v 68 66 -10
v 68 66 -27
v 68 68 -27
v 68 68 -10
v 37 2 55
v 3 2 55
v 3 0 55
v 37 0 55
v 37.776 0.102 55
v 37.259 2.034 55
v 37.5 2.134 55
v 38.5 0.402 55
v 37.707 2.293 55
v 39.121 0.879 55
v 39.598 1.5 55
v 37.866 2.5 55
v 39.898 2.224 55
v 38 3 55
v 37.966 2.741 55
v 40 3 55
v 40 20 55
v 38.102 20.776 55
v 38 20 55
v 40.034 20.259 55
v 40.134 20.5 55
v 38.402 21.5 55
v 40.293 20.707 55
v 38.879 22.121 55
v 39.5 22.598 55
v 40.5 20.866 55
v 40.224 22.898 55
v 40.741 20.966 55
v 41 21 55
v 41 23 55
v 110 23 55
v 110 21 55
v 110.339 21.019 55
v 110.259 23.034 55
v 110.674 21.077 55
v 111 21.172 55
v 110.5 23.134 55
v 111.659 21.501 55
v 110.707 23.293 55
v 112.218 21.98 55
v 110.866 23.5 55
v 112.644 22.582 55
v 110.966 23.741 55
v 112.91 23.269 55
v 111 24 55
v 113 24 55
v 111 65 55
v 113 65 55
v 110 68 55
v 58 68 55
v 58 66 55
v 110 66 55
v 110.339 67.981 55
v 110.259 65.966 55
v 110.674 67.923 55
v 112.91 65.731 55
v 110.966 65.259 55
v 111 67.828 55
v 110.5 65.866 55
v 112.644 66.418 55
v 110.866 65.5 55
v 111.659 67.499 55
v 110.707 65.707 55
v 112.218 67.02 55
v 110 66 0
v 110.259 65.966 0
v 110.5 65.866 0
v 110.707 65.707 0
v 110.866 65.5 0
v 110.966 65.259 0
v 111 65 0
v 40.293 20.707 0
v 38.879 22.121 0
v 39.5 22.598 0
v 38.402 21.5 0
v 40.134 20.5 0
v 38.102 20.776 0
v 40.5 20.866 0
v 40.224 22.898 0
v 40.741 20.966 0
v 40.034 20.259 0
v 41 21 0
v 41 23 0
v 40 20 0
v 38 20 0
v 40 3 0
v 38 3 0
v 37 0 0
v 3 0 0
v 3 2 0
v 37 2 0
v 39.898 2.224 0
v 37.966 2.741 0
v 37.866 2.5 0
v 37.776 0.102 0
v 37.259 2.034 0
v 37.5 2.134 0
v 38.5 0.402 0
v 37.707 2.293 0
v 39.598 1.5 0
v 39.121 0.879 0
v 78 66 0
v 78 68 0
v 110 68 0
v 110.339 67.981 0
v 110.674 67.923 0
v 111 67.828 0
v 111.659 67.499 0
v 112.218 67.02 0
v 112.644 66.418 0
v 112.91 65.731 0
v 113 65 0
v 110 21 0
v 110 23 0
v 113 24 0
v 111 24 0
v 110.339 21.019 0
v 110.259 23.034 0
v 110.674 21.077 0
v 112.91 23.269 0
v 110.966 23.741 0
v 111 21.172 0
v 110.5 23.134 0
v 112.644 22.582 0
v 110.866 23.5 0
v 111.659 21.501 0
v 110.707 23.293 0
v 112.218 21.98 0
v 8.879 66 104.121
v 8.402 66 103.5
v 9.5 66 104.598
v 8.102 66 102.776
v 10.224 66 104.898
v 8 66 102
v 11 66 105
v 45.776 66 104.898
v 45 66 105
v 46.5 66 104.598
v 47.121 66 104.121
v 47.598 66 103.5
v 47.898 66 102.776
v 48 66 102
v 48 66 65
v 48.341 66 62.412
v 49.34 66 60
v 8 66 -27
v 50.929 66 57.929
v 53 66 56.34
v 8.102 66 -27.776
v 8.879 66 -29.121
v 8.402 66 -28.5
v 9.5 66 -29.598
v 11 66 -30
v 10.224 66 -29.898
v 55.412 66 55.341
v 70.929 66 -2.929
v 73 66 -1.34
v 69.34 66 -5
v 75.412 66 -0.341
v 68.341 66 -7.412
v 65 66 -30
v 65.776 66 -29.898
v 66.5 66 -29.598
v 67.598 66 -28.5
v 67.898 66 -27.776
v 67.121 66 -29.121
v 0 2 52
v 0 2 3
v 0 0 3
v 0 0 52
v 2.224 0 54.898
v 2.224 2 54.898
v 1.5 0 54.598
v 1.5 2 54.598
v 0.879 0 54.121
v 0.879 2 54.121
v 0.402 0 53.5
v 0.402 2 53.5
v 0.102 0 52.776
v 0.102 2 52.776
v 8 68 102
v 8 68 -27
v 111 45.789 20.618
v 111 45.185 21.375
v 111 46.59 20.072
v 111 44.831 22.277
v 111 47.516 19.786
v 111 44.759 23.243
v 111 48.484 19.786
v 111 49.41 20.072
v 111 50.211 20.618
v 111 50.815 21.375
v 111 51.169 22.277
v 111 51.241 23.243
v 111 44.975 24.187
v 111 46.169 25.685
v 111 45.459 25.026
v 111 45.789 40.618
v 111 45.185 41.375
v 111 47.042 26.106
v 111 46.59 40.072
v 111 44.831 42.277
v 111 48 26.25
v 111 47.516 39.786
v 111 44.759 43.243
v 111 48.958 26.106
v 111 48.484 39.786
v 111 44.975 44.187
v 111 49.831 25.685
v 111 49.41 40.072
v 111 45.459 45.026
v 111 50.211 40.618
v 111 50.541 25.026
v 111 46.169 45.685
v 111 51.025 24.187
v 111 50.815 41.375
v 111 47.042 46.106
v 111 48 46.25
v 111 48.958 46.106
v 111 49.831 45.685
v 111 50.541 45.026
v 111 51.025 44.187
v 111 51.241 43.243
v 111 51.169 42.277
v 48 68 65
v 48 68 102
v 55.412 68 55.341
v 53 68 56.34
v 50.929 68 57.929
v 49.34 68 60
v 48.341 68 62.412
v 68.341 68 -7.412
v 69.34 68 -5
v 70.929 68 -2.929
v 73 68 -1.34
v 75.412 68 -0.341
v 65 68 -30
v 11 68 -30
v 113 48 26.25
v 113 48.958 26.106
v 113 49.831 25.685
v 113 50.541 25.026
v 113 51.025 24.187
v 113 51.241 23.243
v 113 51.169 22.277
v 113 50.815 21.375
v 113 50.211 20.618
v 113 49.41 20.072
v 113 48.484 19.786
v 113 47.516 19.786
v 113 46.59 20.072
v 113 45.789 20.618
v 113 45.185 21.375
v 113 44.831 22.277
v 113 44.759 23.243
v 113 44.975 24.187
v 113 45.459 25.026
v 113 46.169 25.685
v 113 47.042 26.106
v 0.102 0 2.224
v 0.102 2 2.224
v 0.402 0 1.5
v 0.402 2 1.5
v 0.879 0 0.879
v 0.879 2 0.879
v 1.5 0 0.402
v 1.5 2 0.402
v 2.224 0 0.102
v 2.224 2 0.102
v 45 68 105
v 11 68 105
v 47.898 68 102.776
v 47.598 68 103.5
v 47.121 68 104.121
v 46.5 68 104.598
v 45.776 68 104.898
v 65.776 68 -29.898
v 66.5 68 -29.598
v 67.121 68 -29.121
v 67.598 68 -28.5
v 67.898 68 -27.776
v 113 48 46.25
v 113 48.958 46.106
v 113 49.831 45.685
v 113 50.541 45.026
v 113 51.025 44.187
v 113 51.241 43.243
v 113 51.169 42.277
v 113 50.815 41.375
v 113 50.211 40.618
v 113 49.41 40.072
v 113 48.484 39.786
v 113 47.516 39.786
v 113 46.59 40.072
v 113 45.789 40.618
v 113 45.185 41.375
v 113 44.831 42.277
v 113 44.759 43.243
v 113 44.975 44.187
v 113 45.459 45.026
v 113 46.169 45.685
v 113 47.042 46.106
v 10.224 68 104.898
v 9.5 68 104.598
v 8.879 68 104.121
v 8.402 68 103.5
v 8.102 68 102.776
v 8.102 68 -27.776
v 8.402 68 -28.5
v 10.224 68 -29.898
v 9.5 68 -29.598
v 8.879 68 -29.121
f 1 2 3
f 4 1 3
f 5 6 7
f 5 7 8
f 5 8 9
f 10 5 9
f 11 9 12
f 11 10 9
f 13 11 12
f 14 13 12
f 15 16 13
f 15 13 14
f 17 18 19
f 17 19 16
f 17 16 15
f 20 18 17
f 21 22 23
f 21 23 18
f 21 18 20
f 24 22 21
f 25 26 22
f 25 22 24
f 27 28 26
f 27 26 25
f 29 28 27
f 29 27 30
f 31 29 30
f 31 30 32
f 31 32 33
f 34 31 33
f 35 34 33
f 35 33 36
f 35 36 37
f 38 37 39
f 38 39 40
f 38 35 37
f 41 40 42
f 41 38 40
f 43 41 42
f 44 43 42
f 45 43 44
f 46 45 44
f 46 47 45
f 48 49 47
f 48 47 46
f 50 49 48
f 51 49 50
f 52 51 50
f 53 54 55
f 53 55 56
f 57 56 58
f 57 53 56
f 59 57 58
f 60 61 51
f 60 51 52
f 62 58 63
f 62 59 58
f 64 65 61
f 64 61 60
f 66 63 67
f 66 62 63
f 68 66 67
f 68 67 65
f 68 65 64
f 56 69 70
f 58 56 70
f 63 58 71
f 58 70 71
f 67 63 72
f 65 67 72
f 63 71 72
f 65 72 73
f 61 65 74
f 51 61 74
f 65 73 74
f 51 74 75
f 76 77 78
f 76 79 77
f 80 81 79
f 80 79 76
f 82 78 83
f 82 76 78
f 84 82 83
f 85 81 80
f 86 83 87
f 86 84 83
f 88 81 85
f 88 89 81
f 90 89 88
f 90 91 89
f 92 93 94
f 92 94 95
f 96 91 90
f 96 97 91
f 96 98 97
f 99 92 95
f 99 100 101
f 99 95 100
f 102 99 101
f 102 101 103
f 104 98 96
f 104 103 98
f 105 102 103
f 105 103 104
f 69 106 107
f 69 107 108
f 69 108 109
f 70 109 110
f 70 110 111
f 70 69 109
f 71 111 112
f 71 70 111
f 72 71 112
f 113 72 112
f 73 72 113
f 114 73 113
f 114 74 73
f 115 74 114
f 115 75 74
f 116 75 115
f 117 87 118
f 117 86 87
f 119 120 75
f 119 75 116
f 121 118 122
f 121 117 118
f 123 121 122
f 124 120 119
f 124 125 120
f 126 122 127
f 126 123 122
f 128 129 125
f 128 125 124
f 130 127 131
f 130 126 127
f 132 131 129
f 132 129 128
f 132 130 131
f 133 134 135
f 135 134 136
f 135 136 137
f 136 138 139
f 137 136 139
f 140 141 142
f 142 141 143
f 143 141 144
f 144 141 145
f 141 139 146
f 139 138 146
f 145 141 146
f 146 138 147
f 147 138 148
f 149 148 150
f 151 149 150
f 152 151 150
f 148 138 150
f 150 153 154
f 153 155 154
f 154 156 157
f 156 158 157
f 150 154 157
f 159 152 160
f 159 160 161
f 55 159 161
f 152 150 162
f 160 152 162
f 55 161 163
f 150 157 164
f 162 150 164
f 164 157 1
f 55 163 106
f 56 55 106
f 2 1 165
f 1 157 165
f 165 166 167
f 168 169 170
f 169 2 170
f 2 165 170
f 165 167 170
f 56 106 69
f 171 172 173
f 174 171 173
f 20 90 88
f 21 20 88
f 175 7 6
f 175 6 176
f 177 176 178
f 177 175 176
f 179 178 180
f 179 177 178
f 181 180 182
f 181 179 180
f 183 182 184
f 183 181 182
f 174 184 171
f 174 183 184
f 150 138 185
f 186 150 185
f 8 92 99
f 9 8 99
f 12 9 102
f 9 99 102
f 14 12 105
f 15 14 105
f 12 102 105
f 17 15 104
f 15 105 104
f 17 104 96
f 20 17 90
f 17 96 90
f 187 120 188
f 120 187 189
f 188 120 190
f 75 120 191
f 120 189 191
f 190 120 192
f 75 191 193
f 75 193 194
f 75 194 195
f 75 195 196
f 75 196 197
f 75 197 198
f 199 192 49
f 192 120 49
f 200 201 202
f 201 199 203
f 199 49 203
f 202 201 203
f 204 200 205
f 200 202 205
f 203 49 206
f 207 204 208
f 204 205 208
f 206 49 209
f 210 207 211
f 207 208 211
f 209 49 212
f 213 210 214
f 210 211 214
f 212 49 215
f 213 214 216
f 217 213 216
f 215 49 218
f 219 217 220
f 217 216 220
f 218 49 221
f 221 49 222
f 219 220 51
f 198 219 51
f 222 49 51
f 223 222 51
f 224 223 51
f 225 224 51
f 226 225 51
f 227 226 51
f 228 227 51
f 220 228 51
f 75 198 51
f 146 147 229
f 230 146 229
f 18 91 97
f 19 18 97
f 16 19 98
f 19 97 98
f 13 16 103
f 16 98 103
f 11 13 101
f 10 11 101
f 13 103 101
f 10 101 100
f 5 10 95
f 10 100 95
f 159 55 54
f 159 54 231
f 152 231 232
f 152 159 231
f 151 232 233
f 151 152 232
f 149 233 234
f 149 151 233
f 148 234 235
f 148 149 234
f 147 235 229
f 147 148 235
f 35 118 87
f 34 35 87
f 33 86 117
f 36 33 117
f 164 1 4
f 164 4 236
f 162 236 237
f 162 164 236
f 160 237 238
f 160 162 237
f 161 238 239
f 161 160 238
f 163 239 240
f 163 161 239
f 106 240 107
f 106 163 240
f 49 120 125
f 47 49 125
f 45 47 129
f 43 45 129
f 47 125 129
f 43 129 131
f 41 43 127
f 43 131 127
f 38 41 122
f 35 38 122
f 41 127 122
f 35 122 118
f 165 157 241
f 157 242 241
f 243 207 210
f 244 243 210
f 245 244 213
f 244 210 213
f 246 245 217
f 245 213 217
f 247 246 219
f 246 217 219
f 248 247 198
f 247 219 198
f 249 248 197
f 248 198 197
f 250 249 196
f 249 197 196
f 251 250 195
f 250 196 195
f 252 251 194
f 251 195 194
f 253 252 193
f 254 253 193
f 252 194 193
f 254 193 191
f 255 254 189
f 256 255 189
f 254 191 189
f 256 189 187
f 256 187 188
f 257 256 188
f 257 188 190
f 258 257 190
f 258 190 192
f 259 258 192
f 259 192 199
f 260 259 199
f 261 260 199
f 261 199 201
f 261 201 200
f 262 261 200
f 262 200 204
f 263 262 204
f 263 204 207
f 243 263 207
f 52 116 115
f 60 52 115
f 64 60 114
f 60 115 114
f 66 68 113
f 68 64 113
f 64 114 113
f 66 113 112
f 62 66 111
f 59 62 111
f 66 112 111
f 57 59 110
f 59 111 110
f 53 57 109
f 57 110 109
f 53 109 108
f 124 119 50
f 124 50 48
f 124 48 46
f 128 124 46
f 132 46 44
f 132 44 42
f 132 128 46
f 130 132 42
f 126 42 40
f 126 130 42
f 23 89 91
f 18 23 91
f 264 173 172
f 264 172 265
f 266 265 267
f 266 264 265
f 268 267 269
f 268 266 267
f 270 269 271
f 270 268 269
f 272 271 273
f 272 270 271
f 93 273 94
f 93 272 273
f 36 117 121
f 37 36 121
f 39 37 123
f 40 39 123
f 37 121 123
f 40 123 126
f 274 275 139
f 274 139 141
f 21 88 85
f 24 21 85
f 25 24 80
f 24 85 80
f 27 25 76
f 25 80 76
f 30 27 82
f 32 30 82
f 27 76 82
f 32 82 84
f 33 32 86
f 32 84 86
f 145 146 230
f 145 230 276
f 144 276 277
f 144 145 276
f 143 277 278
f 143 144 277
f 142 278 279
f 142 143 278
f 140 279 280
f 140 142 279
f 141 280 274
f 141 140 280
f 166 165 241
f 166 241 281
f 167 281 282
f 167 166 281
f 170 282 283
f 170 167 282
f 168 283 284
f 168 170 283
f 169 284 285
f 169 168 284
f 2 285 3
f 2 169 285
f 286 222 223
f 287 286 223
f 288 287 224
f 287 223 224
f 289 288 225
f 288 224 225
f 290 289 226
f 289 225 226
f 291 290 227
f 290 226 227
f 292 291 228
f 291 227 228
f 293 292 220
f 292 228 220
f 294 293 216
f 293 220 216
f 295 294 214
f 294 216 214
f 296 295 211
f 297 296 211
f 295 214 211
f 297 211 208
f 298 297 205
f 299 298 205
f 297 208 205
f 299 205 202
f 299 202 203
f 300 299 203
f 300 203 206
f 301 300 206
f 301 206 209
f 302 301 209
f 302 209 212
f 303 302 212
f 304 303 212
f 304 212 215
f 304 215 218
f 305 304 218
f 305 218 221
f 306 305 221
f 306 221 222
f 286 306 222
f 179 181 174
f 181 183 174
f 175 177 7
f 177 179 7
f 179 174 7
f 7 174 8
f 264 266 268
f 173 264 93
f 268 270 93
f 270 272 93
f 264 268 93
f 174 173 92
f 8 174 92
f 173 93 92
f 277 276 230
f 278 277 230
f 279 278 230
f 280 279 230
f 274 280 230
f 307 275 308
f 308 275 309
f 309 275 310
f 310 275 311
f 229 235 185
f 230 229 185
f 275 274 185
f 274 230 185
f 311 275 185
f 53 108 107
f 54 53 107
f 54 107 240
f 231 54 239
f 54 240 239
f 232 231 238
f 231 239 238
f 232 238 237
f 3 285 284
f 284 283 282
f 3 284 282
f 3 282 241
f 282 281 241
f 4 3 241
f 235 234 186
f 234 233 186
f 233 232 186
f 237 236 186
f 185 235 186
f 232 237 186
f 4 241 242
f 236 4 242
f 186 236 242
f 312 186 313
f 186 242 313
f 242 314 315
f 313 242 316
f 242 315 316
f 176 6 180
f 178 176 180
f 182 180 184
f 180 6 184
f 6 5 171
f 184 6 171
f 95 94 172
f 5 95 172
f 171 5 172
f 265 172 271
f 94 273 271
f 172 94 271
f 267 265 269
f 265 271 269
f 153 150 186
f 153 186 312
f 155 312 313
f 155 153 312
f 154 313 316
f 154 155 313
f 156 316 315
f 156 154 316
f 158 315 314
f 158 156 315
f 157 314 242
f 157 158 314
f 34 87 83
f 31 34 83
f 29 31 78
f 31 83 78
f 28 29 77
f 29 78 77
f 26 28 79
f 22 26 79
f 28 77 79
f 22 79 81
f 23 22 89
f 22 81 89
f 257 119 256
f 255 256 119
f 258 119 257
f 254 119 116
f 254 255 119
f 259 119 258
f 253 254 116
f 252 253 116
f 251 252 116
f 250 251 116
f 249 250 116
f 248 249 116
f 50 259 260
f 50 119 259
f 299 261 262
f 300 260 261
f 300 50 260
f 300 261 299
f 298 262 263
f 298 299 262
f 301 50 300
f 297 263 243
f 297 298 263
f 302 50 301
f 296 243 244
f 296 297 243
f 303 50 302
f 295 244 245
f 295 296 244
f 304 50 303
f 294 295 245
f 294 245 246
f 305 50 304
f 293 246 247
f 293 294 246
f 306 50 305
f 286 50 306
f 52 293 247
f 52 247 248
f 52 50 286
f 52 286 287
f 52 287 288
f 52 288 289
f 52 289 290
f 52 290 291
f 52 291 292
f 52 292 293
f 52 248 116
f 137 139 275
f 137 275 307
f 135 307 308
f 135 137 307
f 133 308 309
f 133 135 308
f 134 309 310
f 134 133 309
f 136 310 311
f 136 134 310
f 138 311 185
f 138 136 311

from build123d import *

# Parameters (mm, degrees)
EXTRUDE_1_DEPTH             = 55
EXTRUDE_3_DEPTH             = 2
CUT_EXTRUDE_1_REACH         = 169.242
SKETCH_6_R                  = 3.25
FILLET_1_R                  = 3
SHEET_METAL_1_OUTLINE_W     = 2
SHEET_METAL_1_OUTLINE_H     = 135
SHEET_METAL_1_OUTLINE_W_2   = 23
SHEET_METAL_1_OUTLINE_H_2   = 55
SHEET_METAL_1_DEPTH         = 111
SHEET_START                 = 111
SHEET_METAL_1_2_DEPTH       = 2
SHEET_START_2               = -30
SHEET_METAL_1_3_DEPTH       = 135
SHEET_METAL_1_3_2_DEPTH     = 55
SHEET_METAL_1_3_3_OUTLINE_W = 40
SHEET_METAL_1_3_3_OUTLINE_H = 2
SHEET_METAL_1_3_3_DEPTH     = 135
SHEET_METAL_1_3_4_OUTLINE_W = 20
SHEET_METAL_1_3_4_OUTLINE_H = 2
SHEET_METAL_1_3_4_DEPTH     = 95
SHEET_START_3               = -10
SHEET_METAL_1_3_5_DEPTH     = 10
SHEET_START_4               = -1
SHEET_METAL_1_3_6_DEPTH     = 70


with BuildPart() as part:
    # Sketch 2 → 凸台-拉伸1 (new body)
    with BuildSketch(Plane.XY):
        Polygon((0, 0), (40, 0), (40, 21), (113, 21), (113, 68), (8, 68), (8, 66), (111, 66), (111, 23), (38, 23), (38, 2), (0, 2), align=None)
    extrude(amount=EXTRUDE_1_DEPTH)

    # 草图4 → 凸台-拉伸3 (add)
    with BuildSketch(Plane(origin=(0, 68, 0), x_dir=(1, 0, 0), z_dir=(0, 1, 0))):
        with BuildLine():
            Line((8, 27), (8, 0))
            Line((8, 0), (78, 0))
            ThreePointArc((78, 0), (70.928932188, 2.928932188), (68, 10))
            Line((68, 10), (68, 27))
            ThreePointArc((68, 27), (67.121320344, 29.121320344), (65, 30))
            Line((65, 30), (11, 30))
            ThreePointArc((11, 30), (8.878679656, 29.121320344), (8, 27))
        make_face()
        with BuildLine():
            Line((58, -55), (8, -55))
            Line((8, -55), (8, -102))
            ThreePointArc((8, -102), (8.878679656, -104.121320344), (11, -105))
            Line((11, -105), (45, -105))
            ThreePointArc((45, -105), (47.121320344, -104.121320344), (48, -102))
            Line((48, -102), (48, -65))
            ThreePointArc((48, -65), (50.928932188, -57.928932188), (58, -55))
        make_face()
    extrude(amount=-EXTRUDE_3_DEPTH)

    # 草图6 → 切除-拉伸1 (cut, up to next)
    with BuildSketch(Plane.ZY.offset(-111), mode=Mode.PRIVATE) as cut_extrude_1_sk1:
        with Locations((23, 48)):
            Circle(SKETCH_6_R)
    cut_extrude_1_tool1 = extrude(cut_extrude_1_sk1.sketch, amount=-CUT_EXTRUDE_1_REACH, mode=Mode.PRIVATE) & part.part
    # 草图6 → 切除-拉伸1 (cut, up to next)
    with BuildSketch(Plane.ZY.offset(-111), mode=Mode.PRIVATE) as cut_extrude_1_sk2:
        with Locations((43, 48)):
            Circle(SKETCH_6_R)
    cut_extrude_1_tool2 = extrude(cut_extrude_1_sk2.sketch, amount=-CUT_EXTRUDE_1_REACH, mode=Mode.PRIVATE) & part.part
    add(cut_extrude_1_tool1.solids().sort_by_distance((111, 48, 23))[0], mode=Mode.SUBTRACT)
    add(cut_extrude_1_tool2.solids().sort_by_distance((111, 48, 43))[0], mode=Mode.SUBTRACT)

    # 圆角1
    fillet_1_edges = [part.edges().sort_by_distance(p)[0] for p in [
        (0, 1, 0),
        (0, 1, 55),
    ]]
    fillet(fillet_1_edges, radius=FILLET_1_R)

    # Sheet Metal 1: read off the stored shape, not the designer's step
    # Sheet Metal 1 outline → Sheet Metal 1 (cut)
    with BuildSketch(Plane.YZ):
        with Locations((67, 37.5)):
            Rectangle(SHEET_METAL_1_OUTLINE_W, SHEET_METAL_1_OUTLINE_H)
        with Locations((11.5, 27.5)):
            Rectangle(SHEET_METAL_1_OUTLINE_W_2, SHEET_METAL_1_OUTLINE_H_2)
    extrude(amount=SHEET_METAL_1_DEPTH, mode=Mode.SUBTRACT)

    # Sheet Metal 1 2 outline → Sheet Metal 1 2 (add)
    with BuildSketch(Plane.YZ.offset(SHEET_START)):
        with BuildLine():
            Line((68, 0), (100, 0))
            ThreePointArc((100, 0), (107.071067812, -2.928932188), (110, -10))
            Line((110, -10), (110, -27))
            ThreePointArc((110, -27), (110.878679656, -29.121320344), (113, -30))
            Line((113, -30), (167, -30))
            ThreePointArc((167, -30), (169.121320344, -29.121320344), (170, -27))
            Line((170, -27), (170, 102))
            ThreePointArc((170, 102), (169.121320344, 104.121320344), (167, 105))
            Line((167, 105), (133, 105))
            ThreePointArc((133, 105), (130.878679656, 104.121320344), (130, 102))
            Line((130, 102), (130, 65))
            ThreePointArc((130, 65), (127.071067812, 57.928932188), (120, 55))
            Line((120, 55), (68, 55))
            Line((68, 55), (68, 0))
        make_face()
        with BuildLine():
            Line((21, 0), (21, 55))
            Line((21, 55), (-105, 55))
            ThreePointArc((-105, 55), (-107.121320344, 54.121320344), (-108, 52))
            Line((-108, 52), (-108, 3))
            ThreePointArc((-108, 3), (-107.121320344, 0.878679656), (-105, 0))
            Line((-105, 0), (21, 0))
        make_face()
    extrude(amount=SHEET_METAL_1_2_DEPTH)

    # Sheet Metal 1 3: read off the stored shape, not the designer's step
    # Sheet Metal 1 3 outline → Sheet Metal 1 3 (cut)
    with BuildSketch(Plane.XY.offset(SHEET_START_2)):
        with BuildLine():
            ThreePointArc((113, 24), (112.449489743, 22.267949192), (111, 21.171572875))
            Line((111, 21.171572875), (111, -108))
            Line((111, -108), (113, -108))
            Line((113, -108), (113, 24))
        make_face()
        with BuildLine():
            ThreePointArc((111, 67.828427125), (112.449489743, 66.732050808), (113, 65))
            Line((113, 65), (113, 170))
            Line((113, 170), (111, 170))
            Line((111, 170), (111, 67.828427125))
        make_face()
    extrude(amount=SHEET_METAL_1_3_DEPTH, mode=Mode.SUBTRACT)

    # Sheet Metal 1 3 2 outline → Sheet Metal 1 3 2 (add)
    with BuildSketch(Plane.XY):
        with BuildLine():
            Line((37, 2), (0, 2))
            Line((0, 2), (0, 0))
            Line((0, 0), (37, 0))
            ThreePointArc((37, 0), (39.121320344, 0.878679656), (40, 3))
            Line((40, 3), (40, 20))
            ThreePointArc((40, 20), (40.292893219, 20.707106781), (41, 21))
            Line((41, 21), (110, 21))
            ThreePointArc((110, 21), (110.507305936, 21.043204321), (111, 21.171572875))
            Line((111, 21.171572875), (111, 24))
            ThreePointArc((111, 24), (110.707106781, 23.292893219), (110, 23))
            Line((110, 23), (41, 23))
            ThreePointArc((41, 23), (38.878679656, 22.121320344), (38, 20))
            Line((38, 20), (38, 3))
            ThreePointArc((38, 3), (37.707106781, 2.292893219), (37, 2))
        make_face()
        with BuildLine():
            ThreePointArc((110, 66), (110.707106781, 65.707106781), (111, 65))
            Line((111, 65), (111, 67.828427125))
            ThreePointArc((111, 67.828427125), (110.507305936, 67.956795679), (110, 68))
            Line((110, 68), (8, 68))
            Line((8, 68), (8, 66))
            Line((8, 66), (110, 66))
        make_face()
    extrude(amount=SHEET_METAL_1_3_2_DEPTH)

    # Sheet Metal 1 3 3 outline → Sheet Metal 1 3 3 (add)
    with BuildSketch(Plane.XY.offset(SHEET_START_2)):
        with Locations((28, 67)):
            Rectangle(SHEET_METAL_1_3_3_OUTLINE_W, SHEET_METAL_1_3_3_OUTLINE_H)
    extrude(amount=SHEET_METAL_1_3_3_DEPTH)

    # Sheet Metal 1 3 4 outline → Sheet Metal 1 3 4 (add)
    with BuildSketch(Plane.XY.offset(SHEET_START_2)):
        with Locations((58, 67)):
            Rectangle(SHEET_METAL_1_3_4_OUTLINE_W, SHEET_METAL_1_3_4_OUTLINE_H)
    extrude(amount=SHEET_METAL_1_3_4_DEPTH)

    # Sheet Metal 1 3 5 outline → Sheet Metal 1 3 5 (add)
    with BuildSketch(Plane.XY.offset(SHEET_START_3)):
        with BuildLine():
            Line((68, 68), (68, 66))
            Line((68, 66), (110, 66))
            ThreePointArc((110, 66), (110.707106781, 65.707106781), (111, 65))
            Line((111, 65), (111, 67.828427125))
            ThreePointArc((111, 67.828427125), (110.507305936, 67.956795679), (110, 68))
            Line((110, 68), (68, 68))
        make_face()
    extrude(amount=SHEET_METAL_1_3_5_DEPTH)

    # Sheet Metal 1 3 6 outline → Sheet Metal 1 3 6 (cut)
    with BuildSketch(Plane(origin=(0, 0, 0), x_dir=(1, 0, 0), z_dir=(0, 1, 0)).offset(SHEET_START_4)):
        with BuildLine():
            Line((0, -55), (3, -55))
            ThreePointArc((3, -55), (0.878679656, -54.121320344), (0, -52))
            Line((0, -52), (0, -55))
        make_face()
        with BuildLine():
            Line((0, 0), (0, -3))
            ThreePointArc((0, -3), (0.878679656, -0.878679656), (3, 0))
            Line((3, 0), (0, 0))
        make_face()
        with BuildLine():
            ThreePointArc((11, -105), (8.878679656, -104.121320344), (8, -102))
            Line((8, -102), (8, -105))
            Line((8, -105), (11, -105))
        make_face()
        with BuildLine():
            Line((8, 30), (8, 27))
            ThreePointArc((8, 27), (8.878679656, 29.121320344), (11, 30))
            Line((11, 30), (8, 30))
        make_face()
        with BuildLine():
            ThreePointArc((48, -102), (47.121320344, -104.121320344), (45, -105))
            Line((45, -105), (48, -105))
            Line((48, -105), (48, -102))
        make_face()
        with BuildLine():
            Line((68, 30), (65, 30))
            ThreePointArc((65, 30), (67.121320344, 29.121320344), (68, 27))
            Line((68, 27), (68, 30))
        make_face()
        with BuildLine():
            Line((68, -55), (58, -55))
            ThreePointArc((58, -55), (50.928932188, -57.928932188), (48, -65))
            Line((48, -65), (68, -65))
            Line((68, -65), (68, -55))
        make_face()
        with BuildLine():
            ThreePointArc((68, 10), (70.928932188, 2.928932188), (78, 0))
            Line((78, 0), (111, 0))
            Line((111, 0), (111, 10))
            Line((111, 10), (68, 10))
        make_face()
    extrude(amount=SHEET_METAL_1_3_6_DEPTH, mode=Mode.SUBTRACT)


solid = part.part
